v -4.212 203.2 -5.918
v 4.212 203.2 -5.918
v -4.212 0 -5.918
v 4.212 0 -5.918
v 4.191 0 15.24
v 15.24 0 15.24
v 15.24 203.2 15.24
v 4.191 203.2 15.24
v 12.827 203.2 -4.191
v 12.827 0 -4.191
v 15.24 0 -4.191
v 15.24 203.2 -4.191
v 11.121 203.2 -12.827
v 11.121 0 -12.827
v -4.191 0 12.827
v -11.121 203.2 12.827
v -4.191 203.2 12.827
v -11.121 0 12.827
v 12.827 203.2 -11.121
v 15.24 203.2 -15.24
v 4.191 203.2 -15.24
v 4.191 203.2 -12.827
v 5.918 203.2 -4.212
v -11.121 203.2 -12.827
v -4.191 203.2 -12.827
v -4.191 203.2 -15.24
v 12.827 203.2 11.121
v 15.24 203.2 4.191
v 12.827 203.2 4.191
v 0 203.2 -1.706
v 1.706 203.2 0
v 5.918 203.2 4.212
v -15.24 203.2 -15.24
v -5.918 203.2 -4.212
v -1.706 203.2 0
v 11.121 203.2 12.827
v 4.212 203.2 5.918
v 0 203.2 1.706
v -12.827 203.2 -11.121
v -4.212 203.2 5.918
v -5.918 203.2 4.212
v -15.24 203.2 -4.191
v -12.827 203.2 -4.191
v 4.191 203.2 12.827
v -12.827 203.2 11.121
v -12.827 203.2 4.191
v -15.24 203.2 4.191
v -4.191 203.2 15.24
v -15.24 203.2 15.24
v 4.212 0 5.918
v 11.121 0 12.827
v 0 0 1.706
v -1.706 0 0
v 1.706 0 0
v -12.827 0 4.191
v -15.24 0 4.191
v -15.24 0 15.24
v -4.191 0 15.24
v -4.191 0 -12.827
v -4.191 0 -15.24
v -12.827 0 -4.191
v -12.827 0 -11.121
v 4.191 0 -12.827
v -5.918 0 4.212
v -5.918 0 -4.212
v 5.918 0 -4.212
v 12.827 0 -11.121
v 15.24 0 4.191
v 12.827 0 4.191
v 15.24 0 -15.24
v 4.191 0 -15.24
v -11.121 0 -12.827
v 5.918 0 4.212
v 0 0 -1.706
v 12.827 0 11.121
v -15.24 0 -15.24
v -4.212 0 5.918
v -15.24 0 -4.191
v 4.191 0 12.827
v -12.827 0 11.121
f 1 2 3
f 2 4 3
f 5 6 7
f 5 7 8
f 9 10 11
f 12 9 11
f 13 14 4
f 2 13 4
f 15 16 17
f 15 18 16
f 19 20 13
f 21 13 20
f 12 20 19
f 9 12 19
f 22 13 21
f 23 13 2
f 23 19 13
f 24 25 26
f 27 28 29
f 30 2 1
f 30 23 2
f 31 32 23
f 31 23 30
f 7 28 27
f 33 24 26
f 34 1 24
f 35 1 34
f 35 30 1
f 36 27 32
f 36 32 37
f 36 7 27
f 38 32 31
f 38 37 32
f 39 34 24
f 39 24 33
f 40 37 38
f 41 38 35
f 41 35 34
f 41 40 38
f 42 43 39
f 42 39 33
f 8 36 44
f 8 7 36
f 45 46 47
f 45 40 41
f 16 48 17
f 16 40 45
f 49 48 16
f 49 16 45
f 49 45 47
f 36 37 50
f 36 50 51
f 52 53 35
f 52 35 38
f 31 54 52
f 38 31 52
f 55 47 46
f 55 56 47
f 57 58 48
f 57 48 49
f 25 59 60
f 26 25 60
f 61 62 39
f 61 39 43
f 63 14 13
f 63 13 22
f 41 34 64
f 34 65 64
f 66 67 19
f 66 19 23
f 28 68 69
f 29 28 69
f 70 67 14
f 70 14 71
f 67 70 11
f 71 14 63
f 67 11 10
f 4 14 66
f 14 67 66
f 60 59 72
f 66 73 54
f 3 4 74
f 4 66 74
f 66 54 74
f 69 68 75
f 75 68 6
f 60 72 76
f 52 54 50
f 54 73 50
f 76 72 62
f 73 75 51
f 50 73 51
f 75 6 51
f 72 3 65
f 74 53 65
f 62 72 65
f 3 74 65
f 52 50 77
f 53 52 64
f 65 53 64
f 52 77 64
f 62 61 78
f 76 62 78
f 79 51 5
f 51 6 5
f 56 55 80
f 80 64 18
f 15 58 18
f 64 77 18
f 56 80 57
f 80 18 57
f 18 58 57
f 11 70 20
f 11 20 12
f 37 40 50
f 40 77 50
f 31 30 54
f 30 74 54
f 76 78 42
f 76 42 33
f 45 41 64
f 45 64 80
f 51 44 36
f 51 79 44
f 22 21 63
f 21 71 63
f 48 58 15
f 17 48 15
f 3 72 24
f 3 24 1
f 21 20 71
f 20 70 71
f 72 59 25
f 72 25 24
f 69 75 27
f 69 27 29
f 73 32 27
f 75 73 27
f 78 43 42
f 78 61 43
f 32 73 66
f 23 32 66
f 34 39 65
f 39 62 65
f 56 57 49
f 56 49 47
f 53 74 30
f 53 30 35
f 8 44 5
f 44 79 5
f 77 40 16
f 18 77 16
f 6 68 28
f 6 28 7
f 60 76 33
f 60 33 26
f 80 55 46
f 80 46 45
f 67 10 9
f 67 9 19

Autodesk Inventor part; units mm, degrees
ref_plane "YZ Plane" through (0, 0, 0) normal (1, 0, 0) x (0, 1, 0)
ref_plane "XZ Plane" through (0, 0, 0) normal (0, 1, 0) x (-1, 0, 0)
ref_plane "XY Plane" through (0, 0, 0) normal (0, 0, 1) x (1, 0, 0)
sketch "Sketch1" plane through (0, 0, 0) normal (0, 1, 0) x (-1, 0, 0)
  line L0 (0, -21.336) -> (0, 21.336) projected
  line L1 (-21.336, 0) -> (21.336, 0) projected
  line L2 (15.24, -15.24) -> (4.191, -15.24)
  line L3 (-15.24, -15.24) -> (-4.191, -15.24)
  line L4 (15.24, 4.191) -> (12.827, 4.191)
  line L5 (12.827, -4.191) -> (15.24, -4.191)
  line L6 (-4.191, 12.827) -> (-4.191, 15.24)
  line L7 (4.191, 15.24) -> (4.191, 12.827)
  line L8 (-11.1208, -12.827) -> (-4.212, -5.9182)
  line L9 (-12.827, -11.1208) -> (-5.9182, -4.212)
  line L10 (-5.9182, 4.212) -> (-12.827, 11.1208)
  line L11 (-4.212, 5.9182) -> (-11.1208, 12.827)
  line L12 (-1.7062, 0) -> (0, 1.7062)
  line L13 (4.212, 5.9182) -> (11.1208, 12.827)
  line L14 (0, -1.7062) -> (1.7062, 0)
  line L15 (5.9182, 4.212) -> (12.827, 11.1208)
  line L16 (12.827, -11.1208) -> (5.9182, -4.212)
  line L17 (1.7062, 0) -> (0, 1.7062)
  line L18 (11.1208, -12.827) -> (4.212, -5.9182)
  line L19 (0, -1.7062) -> (-1.7062, 0)
  line L20 (4.191, -12.827) -> (4.191, -15.24)
  line L21 (-15.24, 4.191) -> (-12.827, 4.191)
  line L22 (-4.191, -15.24) -> (-4.191, -12.827)
  line L23 (-12.827, -4.191) -> (-15.24, -4.191)
  line L24 (11.1208, 12.827) -> (4.191, 12.827)
  line L25 (-4.191, 12.827) -> (-11.1208, 12.827)
  line L26 (-12.827, 11.1208) -> (-12.827, 4.191)
  line L27 (-12.827, -4.191) -> (-12.827, -11.1208)
  line L28 (-11.1208, -12.827) -> (-4.191, -12.827)
  line L29 (4.191, -12.827) -> (11.1208, -12.827)
  line L30 (12.827, -11.1208) -> (12.827, -4.191)
  line L31 (12.827, 4.191) -> (12.827, 11.1208)
  line L32 (-15.24, -15.24) -> (-15.24, -4.191)
  line L33 (-15.24, 4.191) -> (-15.24, 15.24)
  line L34 (15.24, -15.24) -> (4.191, -15.24)
  line L35 (-4.191, -15.24) -> (-15.24, -15.24)
  line L36 (15.24, 15.24) -> (15.24, 4.191)
  line L37 (15.24, -4.191) -> (15.24, -15.24)
  line L38 (-15.24, 15.24) -> (-4.191, 15.24)
  line L39 (4.191, 15.24) -> (15.24, 15.24)
  line L40 (4.212, 5.9182) -> (-4.212, 5.9182)
  line L41 (-5.9182, 4.212) -> (-5.9182, -4.212)
  line L42 (-4.212, -5.9182) -> (4.212, -5.9182)
  line L43 (5.9182, -4.212) -> (5.9182, 4.212)
  line L44 (5.9182, 5.9182) -> (-5.9182, -5.9182) construction
  line L45 (-5.9182, 5.9182) -> (5.9182, -5.9182) construction
  point P0 (0, 0)
  point P1 (0, -4.191)
  point P2 (-4.191, 0)
  point P3 (0, 4.191)
  point P4 (4.191, 0)
  dimension "d4" = 11.049
  dimension "d5" = 30.48
  dimension "d6" = 30.48
  dimension "d15" = 11.8364
  dimension "d16" = 11.8364
extrude "Extrusion1" add sketch "Sketch1" along normal blind 203.2 contours L42 L8 L28 L22 L3 L32 L23 L27 L9 L41 L1 L19 L0 | L0 L14 L1 L43 L16 L30 L5 L37 L2 L20 L29 L18 L42 | L17 L0 L40 L13 L24 L7 L39 L36 L4 L31 L15 L43 L1 | L1 L41 L10 L26 L21 L33 L38 L6 L25 L11 L40 L0 L12
properties part number "ProfileOne-01"
